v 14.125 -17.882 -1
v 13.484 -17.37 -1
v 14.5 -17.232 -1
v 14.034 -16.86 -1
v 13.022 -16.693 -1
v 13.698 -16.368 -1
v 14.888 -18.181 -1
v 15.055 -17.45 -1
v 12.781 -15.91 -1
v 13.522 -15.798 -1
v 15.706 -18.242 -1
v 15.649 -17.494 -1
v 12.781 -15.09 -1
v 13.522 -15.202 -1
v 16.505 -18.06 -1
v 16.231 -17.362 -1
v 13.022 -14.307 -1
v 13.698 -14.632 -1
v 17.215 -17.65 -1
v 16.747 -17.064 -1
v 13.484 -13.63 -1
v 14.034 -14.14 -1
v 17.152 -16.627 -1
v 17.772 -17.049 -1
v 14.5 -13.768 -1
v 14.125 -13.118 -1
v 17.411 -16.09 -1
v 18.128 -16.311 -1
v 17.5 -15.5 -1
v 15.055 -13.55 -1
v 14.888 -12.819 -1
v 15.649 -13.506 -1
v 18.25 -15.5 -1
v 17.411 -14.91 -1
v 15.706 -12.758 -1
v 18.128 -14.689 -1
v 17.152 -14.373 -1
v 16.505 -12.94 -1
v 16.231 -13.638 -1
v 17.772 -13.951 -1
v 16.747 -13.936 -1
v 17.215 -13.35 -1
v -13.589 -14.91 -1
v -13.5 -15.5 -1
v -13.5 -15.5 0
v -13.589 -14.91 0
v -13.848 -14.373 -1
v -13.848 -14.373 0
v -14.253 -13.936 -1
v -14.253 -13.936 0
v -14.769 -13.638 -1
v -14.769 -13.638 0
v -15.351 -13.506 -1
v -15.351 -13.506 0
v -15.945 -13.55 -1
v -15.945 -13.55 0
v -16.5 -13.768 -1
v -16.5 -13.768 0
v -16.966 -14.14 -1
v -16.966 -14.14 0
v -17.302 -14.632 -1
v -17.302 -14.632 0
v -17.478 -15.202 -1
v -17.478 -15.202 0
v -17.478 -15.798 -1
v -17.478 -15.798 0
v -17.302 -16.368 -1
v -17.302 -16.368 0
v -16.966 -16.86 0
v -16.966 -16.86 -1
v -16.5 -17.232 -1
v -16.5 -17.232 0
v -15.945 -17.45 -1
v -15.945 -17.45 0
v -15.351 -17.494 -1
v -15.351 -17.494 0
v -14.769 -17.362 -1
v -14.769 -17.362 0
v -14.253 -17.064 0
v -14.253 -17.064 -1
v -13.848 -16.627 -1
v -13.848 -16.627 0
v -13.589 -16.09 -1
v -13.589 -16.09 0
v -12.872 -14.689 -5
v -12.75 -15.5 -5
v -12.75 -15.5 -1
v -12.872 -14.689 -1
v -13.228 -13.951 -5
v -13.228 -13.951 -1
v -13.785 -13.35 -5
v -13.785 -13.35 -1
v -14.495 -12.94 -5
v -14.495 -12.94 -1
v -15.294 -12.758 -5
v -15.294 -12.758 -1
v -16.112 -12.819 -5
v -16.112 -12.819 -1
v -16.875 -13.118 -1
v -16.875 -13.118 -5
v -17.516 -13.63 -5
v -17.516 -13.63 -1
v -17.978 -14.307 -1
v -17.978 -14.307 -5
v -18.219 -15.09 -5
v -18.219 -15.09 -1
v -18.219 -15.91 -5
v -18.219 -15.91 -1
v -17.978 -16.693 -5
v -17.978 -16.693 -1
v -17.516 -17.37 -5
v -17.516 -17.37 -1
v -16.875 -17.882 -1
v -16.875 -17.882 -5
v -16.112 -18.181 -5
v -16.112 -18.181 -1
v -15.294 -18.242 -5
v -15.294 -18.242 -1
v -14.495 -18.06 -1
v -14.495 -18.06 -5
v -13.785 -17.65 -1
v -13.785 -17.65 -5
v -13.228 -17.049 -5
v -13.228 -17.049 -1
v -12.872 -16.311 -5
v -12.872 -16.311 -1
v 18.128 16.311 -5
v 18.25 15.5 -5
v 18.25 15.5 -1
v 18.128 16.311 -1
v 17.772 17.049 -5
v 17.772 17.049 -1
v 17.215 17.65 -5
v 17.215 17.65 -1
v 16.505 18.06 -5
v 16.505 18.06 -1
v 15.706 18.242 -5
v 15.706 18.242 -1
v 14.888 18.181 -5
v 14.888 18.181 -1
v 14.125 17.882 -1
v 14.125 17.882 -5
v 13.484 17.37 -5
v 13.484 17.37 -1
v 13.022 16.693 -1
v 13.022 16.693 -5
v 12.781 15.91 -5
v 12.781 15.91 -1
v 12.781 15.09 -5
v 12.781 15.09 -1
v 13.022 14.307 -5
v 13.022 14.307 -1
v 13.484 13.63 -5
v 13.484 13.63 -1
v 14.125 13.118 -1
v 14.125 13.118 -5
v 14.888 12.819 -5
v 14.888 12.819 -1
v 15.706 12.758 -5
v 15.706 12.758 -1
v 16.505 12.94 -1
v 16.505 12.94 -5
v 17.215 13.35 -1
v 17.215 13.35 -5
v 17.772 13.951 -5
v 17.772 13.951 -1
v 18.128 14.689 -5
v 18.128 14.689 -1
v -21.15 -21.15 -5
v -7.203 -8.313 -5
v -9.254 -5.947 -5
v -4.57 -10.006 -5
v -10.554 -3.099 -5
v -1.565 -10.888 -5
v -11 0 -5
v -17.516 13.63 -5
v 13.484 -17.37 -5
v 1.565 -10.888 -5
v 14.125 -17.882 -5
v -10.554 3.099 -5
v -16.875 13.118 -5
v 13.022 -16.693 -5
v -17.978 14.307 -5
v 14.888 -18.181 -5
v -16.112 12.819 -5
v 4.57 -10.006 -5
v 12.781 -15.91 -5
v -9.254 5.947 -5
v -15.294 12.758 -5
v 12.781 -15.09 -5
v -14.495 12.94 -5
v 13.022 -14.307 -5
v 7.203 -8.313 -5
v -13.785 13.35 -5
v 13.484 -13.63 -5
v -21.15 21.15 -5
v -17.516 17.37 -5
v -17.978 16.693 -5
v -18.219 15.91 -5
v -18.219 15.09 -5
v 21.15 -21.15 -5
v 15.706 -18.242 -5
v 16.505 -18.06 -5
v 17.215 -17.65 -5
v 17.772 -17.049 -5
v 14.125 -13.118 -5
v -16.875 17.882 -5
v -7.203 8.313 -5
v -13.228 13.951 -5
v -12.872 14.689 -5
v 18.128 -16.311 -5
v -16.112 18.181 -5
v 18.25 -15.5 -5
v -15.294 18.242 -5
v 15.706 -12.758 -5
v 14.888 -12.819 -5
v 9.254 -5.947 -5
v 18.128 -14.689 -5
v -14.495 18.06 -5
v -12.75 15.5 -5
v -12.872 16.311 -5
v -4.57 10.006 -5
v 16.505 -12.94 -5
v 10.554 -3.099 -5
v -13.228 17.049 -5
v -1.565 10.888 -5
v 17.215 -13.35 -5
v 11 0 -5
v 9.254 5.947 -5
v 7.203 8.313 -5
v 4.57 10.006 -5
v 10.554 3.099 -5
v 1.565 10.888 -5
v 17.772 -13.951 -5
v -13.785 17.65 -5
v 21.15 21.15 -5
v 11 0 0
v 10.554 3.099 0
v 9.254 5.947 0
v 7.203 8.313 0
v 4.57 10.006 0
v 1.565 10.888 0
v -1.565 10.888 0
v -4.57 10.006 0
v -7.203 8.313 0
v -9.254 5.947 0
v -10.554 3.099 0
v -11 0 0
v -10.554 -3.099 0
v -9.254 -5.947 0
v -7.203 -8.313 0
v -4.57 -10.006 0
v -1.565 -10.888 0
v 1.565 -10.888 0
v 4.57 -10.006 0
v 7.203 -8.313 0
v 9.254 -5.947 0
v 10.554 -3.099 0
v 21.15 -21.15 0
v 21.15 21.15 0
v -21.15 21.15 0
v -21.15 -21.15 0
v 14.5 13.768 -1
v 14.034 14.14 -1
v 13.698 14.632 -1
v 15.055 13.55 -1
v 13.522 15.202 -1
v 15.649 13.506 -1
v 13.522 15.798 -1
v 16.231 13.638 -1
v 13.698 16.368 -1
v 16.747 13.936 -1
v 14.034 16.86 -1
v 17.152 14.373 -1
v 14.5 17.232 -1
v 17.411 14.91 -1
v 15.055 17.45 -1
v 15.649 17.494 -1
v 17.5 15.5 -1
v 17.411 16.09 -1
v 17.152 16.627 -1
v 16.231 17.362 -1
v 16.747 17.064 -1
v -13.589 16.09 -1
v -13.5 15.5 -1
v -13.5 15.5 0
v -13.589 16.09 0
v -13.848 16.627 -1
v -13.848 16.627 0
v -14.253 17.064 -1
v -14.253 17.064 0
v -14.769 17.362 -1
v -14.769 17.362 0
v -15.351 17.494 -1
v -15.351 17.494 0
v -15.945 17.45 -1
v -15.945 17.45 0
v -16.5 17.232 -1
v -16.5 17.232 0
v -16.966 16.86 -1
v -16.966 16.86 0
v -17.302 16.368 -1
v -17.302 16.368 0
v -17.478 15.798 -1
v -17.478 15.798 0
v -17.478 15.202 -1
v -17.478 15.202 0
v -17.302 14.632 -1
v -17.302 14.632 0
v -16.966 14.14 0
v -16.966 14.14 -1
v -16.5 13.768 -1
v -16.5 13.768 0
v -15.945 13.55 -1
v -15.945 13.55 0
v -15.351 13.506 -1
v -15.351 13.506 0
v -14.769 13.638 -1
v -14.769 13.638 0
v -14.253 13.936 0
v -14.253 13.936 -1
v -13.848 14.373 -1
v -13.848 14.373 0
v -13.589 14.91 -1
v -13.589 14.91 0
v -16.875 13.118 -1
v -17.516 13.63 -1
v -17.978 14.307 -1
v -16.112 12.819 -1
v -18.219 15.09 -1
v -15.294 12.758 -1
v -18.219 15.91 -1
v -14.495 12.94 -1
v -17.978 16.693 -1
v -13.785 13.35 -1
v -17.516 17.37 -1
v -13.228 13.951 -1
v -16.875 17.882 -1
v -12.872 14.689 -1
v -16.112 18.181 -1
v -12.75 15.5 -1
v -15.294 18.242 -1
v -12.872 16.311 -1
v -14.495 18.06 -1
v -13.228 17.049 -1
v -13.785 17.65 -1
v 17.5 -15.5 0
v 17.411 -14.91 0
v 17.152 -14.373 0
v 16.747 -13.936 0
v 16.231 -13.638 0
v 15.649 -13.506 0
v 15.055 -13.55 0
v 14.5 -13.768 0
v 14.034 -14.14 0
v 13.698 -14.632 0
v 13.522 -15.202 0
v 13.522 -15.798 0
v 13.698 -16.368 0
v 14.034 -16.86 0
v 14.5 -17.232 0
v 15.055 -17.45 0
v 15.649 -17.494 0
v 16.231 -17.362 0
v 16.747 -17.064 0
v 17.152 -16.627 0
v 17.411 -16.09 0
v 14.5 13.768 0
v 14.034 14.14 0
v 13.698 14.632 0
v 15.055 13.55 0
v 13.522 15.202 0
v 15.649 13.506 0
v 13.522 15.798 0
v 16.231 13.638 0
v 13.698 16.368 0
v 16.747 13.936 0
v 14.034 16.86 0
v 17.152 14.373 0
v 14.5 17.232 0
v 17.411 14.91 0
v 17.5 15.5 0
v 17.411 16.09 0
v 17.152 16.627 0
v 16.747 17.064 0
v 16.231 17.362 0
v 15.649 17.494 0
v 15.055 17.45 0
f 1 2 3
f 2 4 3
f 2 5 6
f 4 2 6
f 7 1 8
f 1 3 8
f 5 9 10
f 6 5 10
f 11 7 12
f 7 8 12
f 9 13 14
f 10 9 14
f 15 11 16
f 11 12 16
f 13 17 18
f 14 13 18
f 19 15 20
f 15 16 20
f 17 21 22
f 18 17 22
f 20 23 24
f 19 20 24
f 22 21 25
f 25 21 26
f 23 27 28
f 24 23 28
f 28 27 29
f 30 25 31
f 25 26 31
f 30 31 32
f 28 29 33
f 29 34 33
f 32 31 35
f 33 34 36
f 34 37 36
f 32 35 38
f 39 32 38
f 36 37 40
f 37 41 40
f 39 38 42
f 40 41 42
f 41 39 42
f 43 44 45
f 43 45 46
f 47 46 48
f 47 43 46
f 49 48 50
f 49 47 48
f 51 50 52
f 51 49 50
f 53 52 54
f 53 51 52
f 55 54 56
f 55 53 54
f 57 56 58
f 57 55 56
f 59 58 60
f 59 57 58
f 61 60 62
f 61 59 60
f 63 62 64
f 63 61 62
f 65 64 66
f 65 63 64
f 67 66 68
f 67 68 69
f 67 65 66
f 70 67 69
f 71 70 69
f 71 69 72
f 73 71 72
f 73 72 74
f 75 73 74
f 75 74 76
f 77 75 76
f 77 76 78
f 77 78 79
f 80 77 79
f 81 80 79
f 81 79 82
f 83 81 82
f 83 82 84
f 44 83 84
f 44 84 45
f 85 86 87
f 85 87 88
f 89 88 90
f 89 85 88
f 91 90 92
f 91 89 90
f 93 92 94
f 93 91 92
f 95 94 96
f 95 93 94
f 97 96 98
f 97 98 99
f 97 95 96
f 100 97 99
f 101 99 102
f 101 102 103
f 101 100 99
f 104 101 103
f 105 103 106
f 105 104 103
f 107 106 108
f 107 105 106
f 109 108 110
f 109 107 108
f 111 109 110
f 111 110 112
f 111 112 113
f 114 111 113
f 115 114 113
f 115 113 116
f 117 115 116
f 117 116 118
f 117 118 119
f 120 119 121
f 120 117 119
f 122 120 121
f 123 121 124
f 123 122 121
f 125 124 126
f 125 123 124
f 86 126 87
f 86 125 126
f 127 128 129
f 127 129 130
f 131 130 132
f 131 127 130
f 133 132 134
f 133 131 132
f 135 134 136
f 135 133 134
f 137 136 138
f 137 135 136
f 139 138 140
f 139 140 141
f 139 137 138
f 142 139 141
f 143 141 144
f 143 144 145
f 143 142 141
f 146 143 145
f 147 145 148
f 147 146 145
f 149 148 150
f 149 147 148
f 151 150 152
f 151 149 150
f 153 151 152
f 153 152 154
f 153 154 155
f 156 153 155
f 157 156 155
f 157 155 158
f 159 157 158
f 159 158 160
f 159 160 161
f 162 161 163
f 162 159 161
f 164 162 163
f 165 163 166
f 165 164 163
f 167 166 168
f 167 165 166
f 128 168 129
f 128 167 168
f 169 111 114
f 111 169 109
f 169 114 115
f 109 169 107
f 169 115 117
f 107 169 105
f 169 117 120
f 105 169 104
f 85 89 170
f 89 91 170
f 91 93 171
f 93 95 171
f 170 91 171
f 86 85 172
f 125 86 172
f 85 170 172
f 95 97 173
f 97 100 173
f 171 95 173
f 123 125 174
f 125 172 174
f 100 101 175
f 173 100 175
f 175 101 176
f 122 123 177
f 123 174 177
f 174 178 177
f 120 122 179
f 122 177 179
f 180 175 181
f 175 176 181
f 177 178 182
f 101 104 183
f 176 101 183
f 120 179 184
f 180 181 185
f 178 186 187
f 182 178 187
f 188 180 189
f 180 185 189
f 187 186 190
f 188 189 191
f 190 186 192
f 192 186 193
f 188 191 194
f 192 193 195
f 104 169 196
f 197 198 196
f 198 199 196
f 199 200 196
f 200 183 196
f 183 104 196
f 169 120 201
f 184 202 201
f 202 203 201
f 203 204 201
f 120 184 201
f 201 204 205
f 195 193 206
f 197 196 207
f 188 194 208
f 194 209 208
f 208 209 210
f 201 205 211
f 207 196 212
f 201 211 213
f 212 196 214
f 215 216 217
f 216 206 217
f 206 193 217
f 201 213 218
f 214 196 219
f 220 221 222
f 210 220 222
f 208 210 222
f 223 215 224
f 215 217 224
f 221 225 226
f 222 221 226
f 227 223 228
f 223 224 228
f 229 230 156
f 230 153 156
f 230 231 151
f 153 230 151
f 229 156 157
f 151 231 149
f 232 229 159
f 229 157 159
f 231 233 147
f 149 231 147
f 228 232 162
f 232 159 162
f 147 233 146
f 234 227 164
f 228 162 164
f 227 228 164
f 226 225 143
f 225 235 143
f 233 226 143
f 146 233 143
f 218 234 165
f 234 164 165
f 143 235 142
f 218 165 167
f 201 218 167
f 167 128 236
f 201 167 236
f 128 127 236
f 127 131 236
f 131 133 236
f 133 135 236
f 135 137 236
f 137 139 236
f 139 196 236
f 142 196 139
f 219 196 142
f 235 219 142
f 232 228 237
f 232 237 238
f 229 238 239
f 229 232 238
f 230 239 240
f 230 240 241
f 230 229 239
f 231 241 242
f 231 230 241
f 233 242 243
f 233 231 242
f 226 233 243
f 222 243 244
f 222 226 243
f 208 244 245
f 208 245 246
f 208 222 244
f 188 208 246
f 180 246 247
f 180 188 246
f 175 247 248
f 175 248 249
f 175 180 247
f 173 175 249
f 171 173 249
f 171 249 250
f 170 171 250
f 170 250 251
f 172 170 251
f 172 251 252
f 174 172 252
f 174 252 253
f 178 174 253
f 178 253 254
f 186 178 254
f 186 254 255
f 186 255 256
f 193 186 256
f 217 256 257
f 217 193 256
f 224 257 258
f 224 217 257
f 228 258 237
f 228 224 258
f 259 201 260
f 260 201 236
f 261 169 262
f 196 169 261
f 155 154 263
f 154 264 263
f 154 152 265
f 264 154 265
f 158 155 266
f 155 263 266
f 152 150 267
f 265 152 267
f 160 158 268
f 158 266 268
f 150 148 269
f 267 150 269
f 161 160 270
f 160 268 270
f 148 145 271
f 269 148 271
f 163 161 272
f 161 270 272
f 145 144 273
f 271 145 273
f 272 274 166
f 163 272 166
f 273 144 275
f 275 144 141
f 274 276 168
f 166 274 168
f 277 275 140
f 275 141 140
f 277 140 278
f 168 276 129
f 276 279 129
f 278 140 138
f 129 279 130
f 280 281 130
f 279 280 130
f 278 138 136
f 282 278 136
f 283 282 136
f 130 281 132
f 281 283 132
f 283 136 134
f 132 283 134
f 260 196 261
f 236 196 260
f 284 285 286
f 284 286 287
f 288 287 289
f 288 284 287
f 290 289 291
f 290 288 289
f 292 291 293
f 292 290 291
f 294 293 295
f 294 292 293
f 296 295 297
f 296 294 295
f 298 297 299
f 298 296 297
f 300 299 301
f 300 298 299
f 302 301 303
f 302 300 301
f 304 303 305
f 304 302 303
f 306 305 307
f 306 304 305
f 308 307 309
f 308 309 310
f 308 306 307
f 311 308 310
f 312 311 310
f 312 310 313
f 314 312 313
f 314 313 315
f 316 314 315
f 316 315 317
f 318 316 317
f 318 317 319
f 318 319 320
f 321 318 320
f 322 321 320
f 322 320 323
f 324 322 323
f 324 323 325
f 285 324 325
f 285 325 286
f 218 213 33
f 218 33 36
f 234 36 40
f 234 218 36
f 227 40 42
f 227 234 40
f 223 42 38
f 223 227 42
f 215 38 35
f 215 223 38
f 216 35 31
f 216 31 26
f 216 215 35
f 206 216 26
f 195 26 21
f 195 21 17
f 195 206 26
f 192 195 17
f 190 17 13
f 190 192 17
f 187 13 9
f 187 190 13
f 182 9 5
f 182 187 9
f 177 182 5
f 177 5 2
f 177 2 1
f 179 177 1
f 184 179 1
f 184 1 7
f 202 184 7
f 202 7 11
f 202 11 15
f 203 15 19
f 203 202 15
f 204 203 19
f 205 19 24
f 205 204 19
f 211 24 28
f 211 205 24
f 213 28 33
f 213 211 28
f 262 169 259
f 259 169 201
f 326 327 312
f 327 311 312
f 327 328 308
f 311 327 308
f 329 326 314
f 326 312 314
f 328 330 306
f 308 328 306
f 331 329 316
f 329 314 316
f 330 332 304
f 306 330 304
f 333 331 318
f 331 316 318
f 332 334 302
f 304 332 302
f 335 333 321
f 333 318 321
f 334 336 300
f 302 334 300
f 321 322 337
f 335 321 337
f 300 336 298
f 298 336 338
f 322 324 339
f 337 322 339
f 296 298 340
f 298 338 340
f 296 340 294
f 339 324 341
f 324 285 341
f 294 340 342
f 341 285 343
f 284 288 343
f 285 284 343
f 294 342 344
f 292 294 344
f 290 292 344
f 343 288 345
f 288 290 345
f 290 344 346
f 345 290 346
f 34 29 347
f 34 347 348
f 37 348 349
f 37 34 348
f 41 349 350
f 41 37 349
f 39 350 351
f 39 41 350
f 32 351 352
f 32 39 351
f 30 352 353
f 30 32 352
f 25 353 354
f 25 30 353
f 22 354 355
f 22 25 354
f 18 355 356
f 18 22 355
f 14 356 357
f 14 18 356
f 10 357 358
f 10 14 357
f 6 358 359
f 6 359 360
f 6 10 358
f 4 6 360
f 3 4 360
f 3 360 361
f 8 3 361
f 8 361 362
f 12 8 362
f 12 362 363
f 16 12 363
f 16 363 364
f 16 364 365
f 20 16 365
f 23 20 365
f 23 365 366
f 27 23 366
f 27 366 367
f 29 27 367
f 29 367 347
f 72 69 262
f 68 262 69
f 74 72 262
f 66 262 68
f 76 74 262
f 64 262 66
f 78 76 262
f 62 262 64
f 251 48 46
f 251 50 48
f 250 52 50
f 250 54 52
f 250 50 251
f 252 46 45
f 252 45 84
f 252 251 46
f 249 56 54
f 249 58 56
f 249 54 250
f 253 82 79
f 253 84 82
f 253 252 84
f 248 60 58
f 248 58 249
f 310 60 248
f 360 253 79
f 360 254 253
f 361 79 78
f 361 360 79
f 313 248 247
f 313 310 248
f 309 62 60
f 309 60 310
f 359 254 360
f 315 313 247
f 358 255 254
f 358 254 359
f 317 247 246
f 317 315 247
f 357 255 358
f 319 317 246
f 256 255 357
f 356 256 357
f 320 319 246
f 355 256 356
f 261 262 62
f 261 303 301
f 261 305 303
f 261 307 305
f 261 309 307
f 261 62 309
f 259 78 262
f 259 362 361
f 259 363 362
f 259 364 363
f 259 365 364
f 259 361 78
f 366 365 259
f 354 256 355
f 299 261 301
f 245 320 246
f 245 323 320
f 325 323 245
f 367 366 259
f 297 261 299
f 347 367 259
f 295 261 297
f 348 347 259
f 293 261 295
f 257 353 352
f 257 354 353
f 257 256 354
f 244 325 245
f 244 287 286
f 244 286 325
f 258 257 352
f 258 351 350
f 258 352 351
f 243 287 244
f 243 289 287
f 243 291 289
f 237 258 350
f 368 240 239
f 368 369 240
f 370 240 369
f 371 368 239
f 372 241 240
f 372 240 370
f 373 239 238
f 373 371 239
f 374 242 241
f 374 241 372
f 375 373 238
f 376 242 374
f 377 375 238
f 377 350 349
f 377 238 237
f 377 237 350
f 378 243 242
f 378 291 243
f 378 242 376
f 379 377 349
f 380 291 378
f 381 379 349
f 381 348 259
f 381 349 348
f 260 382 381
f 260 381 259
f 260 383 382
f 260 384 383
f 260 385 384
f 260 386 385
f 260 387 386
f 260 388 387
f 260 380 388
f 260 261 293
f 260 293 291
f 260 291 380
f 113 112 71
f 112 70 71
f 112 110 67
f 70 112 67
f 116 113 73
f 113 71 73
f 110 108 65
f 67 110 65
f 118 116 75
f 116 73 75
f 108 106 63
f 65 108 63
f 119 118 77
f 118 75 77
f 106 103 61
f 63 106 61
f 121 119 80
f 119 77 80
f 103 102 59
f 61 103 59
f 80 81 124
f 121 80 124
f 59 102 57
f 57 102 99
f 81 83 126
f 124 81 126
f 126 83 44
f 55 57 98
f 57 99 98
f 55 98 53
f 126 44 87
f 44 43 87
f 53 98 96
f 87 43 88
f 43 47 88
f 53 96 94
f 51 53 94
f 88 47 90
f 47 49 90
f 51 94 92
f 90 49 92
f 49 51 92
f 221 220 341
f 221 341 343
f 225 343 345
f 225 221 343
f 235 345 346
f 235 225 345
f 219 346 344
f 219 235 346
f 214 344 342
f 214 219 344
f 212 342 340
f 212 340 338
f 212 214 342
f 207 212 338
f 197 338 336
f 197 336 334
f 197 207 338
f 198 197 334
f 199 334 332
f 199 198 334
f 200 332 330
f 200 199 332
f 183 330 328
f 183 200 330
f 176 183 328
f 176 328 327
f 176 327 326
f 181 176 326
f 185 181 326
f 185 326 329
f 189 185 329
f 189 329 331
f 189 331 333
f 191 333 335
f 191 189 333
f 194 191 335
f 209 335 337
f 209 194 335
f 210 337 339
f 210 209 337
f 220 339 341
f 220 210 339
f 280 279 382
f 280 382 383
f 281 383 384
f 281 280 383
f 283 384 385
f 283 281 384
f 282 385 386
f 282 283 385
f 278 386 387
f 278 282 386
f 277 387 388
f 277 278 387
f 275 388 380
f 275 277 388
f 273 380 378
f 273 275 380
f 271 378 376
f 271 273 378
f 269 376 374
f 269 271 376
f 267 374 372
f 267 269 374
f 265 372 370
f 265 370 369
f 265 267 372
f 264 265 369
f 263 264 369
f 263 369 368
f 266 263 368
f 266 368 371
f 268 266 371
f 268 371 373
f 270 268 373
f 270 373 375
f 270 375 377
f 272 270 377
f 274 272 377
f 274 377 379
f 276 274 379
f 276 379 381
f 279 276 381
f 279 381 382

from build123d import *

# Parameters (mm, degrees)
CYLINDER012_R     = 2
CYLINDER012_DEPTH = 5
CYLINDER011_R     = 2.75
CYLINDER011_DEPTH = 4
CYLINDER010_R     = 2
CYLINDER010_DEPTH = 5
CYLINDER009_R     = 2.75
CYLINDER009_DEPTH = 4
CYLINDER008_R     = 2
CYLINDER008_DEPTH = 5
CYLINDER007_R     = 2.75
CYLINDER007_DEPTH = 4
CYLINDER014_R     = 2
CYLINDER014_DEPTH = 5
CYLINDER013_R     = 2.75
CYLINDER013_DEPTH = 4
CYLINDER006_R     = 11
CYLINDER006_DEPTH = 5
BOX005_W          = 42.3
BOX005_H          = 42.3
BOX005_DEPTH      = 5


with BuildPart() as cylinder012:
    # Cylinder012 → Cylinder012 (new body)
    with BuildSketch(Plane.XY.offset(-5)):
        Circle(CYLINDER012_R)
    extrude(amount=CYLINDER012_DEPTH)


with BuildPart() as fusion004:
    # Cylinder011 → Cylinder011 (new body)
    with BuildSketch(Plane.XY.offset(-5)):
        Circle(CYLINDER011_R)
    extrude(amount=CYLINDER011_DEPTH)

    # Fusion004: union Cylinder012
    add(cylinder012.part)


with BuildPart() as fusion004_1:
    # Fusion004 placement: moved
    add(fusion004.part.moved(Location((-15.5, 15.5, 0))))


with BuildPart() as cylinder010:
    # Cylinder010 → Cylinder010 (new body)
    with BuildSketch(Plane.XY.offset(-5)):
        Circle(CYLINDER010_R)
    extrude(amount=CYLINDER010_DEPTH)


with BuildPart() as fusion003:
    # Cylinder009 → Cylinder009 (new body)
    with BuildSketch(Plane.XY.offset(-5)):
        Circle(CYLINDER009_R)
    extrude(amount=CYLINDER009_DEPTH)

    # Fusion003: union Cylinder010
    add(cylinder010.part)


with BuildPart() as fusion003_1:
    # Fusion003 placement: moved
    add(fusion003.part.moved(Location((15.5, -15.5, 0))))


with BuildPart() as cylinder008:
    # Cylinder008 → Cylinder008 (new body)
    with BuildSketch(Plane.XY.offset(-5)):
        Circle(CYLINDER008_R)
    extrude(amount=CYLINDER008_DEPTH)


with BuildPart() as fusion002:
    # Cylinder007 → Cylinder007 (new body)
    with BuildSketch(Plane.XY.offset(-5)):
        Circle(CYLINDER007_R)
    extrude(amount=CYLINDER007_DEPTH)

    # Fusion002: union Cylinder008
    add(cylinder008.part)


with BuildPart() as fusion002_1:
    # Fusion002 placement: moved
    add(fusion002.part.moved(Location((-15.5, -15.5, 0))))


with BuildPart() as cylinder014:
    # Cylinder014 → Cylinder014 (new body)
    with BuildSketch(Plane.XY.offset(-5)):
        Circle(CYLINDER014_R)
    extrude(amount=CYLINDER014_DEPTH)


with BuildPart() as compound006:
    # Cylinder013 → Cylinder013 (new body)
    with BuildSketch(Plane.XY.offset(-5)):
        Circle(CYLINDER013_R)
    extrude(amount=CYLINDER013_DEPTH)

    # Fusion005: union Cylinder014
    add(cylinder014.part)


with BuildPart() as compound006_1:
    # Fusion005 placement: moved
    add(compound006.part.moved(Location((15.5, 15.5, 0))))

    # Compound006: union Fusion004, Fusion003, Fusion002
    add(fusion004_1.part)
    add(fusion003_1.part)
    add(fusion002_1.part)


with BuildPart() as cylinder006:
    # Cylinder006 → Cylinder006 (new body)
    with BuildSketch(Plane.XY.offset(-5)):
        Circle(CYLINDER006_R)
    extrude(amount=CYLINDER006_DEPTH)


with BuildPart() as cut003:
    # Box005 → Box005 (new body)
    with BuildSketch(Plane(origin=(-21.15, -21.15, -5), x_dir=(1, 0, 0), z_dir=(0, 0, 1))):
        with Locations((21.15, 21.15)):
            Rectangle(BOX005_W, BOX005_H)
    extrude(amount=BOX005_DEPTH)

    # Cut002: cut Cylinder006
    add(cylinder006.part, mode=Mode.SUBTRACT)

    # Cut003: cut Compound006
    add(compound006_1.part, mode=Mode.SUBTRACT)


solid = cut003.part
